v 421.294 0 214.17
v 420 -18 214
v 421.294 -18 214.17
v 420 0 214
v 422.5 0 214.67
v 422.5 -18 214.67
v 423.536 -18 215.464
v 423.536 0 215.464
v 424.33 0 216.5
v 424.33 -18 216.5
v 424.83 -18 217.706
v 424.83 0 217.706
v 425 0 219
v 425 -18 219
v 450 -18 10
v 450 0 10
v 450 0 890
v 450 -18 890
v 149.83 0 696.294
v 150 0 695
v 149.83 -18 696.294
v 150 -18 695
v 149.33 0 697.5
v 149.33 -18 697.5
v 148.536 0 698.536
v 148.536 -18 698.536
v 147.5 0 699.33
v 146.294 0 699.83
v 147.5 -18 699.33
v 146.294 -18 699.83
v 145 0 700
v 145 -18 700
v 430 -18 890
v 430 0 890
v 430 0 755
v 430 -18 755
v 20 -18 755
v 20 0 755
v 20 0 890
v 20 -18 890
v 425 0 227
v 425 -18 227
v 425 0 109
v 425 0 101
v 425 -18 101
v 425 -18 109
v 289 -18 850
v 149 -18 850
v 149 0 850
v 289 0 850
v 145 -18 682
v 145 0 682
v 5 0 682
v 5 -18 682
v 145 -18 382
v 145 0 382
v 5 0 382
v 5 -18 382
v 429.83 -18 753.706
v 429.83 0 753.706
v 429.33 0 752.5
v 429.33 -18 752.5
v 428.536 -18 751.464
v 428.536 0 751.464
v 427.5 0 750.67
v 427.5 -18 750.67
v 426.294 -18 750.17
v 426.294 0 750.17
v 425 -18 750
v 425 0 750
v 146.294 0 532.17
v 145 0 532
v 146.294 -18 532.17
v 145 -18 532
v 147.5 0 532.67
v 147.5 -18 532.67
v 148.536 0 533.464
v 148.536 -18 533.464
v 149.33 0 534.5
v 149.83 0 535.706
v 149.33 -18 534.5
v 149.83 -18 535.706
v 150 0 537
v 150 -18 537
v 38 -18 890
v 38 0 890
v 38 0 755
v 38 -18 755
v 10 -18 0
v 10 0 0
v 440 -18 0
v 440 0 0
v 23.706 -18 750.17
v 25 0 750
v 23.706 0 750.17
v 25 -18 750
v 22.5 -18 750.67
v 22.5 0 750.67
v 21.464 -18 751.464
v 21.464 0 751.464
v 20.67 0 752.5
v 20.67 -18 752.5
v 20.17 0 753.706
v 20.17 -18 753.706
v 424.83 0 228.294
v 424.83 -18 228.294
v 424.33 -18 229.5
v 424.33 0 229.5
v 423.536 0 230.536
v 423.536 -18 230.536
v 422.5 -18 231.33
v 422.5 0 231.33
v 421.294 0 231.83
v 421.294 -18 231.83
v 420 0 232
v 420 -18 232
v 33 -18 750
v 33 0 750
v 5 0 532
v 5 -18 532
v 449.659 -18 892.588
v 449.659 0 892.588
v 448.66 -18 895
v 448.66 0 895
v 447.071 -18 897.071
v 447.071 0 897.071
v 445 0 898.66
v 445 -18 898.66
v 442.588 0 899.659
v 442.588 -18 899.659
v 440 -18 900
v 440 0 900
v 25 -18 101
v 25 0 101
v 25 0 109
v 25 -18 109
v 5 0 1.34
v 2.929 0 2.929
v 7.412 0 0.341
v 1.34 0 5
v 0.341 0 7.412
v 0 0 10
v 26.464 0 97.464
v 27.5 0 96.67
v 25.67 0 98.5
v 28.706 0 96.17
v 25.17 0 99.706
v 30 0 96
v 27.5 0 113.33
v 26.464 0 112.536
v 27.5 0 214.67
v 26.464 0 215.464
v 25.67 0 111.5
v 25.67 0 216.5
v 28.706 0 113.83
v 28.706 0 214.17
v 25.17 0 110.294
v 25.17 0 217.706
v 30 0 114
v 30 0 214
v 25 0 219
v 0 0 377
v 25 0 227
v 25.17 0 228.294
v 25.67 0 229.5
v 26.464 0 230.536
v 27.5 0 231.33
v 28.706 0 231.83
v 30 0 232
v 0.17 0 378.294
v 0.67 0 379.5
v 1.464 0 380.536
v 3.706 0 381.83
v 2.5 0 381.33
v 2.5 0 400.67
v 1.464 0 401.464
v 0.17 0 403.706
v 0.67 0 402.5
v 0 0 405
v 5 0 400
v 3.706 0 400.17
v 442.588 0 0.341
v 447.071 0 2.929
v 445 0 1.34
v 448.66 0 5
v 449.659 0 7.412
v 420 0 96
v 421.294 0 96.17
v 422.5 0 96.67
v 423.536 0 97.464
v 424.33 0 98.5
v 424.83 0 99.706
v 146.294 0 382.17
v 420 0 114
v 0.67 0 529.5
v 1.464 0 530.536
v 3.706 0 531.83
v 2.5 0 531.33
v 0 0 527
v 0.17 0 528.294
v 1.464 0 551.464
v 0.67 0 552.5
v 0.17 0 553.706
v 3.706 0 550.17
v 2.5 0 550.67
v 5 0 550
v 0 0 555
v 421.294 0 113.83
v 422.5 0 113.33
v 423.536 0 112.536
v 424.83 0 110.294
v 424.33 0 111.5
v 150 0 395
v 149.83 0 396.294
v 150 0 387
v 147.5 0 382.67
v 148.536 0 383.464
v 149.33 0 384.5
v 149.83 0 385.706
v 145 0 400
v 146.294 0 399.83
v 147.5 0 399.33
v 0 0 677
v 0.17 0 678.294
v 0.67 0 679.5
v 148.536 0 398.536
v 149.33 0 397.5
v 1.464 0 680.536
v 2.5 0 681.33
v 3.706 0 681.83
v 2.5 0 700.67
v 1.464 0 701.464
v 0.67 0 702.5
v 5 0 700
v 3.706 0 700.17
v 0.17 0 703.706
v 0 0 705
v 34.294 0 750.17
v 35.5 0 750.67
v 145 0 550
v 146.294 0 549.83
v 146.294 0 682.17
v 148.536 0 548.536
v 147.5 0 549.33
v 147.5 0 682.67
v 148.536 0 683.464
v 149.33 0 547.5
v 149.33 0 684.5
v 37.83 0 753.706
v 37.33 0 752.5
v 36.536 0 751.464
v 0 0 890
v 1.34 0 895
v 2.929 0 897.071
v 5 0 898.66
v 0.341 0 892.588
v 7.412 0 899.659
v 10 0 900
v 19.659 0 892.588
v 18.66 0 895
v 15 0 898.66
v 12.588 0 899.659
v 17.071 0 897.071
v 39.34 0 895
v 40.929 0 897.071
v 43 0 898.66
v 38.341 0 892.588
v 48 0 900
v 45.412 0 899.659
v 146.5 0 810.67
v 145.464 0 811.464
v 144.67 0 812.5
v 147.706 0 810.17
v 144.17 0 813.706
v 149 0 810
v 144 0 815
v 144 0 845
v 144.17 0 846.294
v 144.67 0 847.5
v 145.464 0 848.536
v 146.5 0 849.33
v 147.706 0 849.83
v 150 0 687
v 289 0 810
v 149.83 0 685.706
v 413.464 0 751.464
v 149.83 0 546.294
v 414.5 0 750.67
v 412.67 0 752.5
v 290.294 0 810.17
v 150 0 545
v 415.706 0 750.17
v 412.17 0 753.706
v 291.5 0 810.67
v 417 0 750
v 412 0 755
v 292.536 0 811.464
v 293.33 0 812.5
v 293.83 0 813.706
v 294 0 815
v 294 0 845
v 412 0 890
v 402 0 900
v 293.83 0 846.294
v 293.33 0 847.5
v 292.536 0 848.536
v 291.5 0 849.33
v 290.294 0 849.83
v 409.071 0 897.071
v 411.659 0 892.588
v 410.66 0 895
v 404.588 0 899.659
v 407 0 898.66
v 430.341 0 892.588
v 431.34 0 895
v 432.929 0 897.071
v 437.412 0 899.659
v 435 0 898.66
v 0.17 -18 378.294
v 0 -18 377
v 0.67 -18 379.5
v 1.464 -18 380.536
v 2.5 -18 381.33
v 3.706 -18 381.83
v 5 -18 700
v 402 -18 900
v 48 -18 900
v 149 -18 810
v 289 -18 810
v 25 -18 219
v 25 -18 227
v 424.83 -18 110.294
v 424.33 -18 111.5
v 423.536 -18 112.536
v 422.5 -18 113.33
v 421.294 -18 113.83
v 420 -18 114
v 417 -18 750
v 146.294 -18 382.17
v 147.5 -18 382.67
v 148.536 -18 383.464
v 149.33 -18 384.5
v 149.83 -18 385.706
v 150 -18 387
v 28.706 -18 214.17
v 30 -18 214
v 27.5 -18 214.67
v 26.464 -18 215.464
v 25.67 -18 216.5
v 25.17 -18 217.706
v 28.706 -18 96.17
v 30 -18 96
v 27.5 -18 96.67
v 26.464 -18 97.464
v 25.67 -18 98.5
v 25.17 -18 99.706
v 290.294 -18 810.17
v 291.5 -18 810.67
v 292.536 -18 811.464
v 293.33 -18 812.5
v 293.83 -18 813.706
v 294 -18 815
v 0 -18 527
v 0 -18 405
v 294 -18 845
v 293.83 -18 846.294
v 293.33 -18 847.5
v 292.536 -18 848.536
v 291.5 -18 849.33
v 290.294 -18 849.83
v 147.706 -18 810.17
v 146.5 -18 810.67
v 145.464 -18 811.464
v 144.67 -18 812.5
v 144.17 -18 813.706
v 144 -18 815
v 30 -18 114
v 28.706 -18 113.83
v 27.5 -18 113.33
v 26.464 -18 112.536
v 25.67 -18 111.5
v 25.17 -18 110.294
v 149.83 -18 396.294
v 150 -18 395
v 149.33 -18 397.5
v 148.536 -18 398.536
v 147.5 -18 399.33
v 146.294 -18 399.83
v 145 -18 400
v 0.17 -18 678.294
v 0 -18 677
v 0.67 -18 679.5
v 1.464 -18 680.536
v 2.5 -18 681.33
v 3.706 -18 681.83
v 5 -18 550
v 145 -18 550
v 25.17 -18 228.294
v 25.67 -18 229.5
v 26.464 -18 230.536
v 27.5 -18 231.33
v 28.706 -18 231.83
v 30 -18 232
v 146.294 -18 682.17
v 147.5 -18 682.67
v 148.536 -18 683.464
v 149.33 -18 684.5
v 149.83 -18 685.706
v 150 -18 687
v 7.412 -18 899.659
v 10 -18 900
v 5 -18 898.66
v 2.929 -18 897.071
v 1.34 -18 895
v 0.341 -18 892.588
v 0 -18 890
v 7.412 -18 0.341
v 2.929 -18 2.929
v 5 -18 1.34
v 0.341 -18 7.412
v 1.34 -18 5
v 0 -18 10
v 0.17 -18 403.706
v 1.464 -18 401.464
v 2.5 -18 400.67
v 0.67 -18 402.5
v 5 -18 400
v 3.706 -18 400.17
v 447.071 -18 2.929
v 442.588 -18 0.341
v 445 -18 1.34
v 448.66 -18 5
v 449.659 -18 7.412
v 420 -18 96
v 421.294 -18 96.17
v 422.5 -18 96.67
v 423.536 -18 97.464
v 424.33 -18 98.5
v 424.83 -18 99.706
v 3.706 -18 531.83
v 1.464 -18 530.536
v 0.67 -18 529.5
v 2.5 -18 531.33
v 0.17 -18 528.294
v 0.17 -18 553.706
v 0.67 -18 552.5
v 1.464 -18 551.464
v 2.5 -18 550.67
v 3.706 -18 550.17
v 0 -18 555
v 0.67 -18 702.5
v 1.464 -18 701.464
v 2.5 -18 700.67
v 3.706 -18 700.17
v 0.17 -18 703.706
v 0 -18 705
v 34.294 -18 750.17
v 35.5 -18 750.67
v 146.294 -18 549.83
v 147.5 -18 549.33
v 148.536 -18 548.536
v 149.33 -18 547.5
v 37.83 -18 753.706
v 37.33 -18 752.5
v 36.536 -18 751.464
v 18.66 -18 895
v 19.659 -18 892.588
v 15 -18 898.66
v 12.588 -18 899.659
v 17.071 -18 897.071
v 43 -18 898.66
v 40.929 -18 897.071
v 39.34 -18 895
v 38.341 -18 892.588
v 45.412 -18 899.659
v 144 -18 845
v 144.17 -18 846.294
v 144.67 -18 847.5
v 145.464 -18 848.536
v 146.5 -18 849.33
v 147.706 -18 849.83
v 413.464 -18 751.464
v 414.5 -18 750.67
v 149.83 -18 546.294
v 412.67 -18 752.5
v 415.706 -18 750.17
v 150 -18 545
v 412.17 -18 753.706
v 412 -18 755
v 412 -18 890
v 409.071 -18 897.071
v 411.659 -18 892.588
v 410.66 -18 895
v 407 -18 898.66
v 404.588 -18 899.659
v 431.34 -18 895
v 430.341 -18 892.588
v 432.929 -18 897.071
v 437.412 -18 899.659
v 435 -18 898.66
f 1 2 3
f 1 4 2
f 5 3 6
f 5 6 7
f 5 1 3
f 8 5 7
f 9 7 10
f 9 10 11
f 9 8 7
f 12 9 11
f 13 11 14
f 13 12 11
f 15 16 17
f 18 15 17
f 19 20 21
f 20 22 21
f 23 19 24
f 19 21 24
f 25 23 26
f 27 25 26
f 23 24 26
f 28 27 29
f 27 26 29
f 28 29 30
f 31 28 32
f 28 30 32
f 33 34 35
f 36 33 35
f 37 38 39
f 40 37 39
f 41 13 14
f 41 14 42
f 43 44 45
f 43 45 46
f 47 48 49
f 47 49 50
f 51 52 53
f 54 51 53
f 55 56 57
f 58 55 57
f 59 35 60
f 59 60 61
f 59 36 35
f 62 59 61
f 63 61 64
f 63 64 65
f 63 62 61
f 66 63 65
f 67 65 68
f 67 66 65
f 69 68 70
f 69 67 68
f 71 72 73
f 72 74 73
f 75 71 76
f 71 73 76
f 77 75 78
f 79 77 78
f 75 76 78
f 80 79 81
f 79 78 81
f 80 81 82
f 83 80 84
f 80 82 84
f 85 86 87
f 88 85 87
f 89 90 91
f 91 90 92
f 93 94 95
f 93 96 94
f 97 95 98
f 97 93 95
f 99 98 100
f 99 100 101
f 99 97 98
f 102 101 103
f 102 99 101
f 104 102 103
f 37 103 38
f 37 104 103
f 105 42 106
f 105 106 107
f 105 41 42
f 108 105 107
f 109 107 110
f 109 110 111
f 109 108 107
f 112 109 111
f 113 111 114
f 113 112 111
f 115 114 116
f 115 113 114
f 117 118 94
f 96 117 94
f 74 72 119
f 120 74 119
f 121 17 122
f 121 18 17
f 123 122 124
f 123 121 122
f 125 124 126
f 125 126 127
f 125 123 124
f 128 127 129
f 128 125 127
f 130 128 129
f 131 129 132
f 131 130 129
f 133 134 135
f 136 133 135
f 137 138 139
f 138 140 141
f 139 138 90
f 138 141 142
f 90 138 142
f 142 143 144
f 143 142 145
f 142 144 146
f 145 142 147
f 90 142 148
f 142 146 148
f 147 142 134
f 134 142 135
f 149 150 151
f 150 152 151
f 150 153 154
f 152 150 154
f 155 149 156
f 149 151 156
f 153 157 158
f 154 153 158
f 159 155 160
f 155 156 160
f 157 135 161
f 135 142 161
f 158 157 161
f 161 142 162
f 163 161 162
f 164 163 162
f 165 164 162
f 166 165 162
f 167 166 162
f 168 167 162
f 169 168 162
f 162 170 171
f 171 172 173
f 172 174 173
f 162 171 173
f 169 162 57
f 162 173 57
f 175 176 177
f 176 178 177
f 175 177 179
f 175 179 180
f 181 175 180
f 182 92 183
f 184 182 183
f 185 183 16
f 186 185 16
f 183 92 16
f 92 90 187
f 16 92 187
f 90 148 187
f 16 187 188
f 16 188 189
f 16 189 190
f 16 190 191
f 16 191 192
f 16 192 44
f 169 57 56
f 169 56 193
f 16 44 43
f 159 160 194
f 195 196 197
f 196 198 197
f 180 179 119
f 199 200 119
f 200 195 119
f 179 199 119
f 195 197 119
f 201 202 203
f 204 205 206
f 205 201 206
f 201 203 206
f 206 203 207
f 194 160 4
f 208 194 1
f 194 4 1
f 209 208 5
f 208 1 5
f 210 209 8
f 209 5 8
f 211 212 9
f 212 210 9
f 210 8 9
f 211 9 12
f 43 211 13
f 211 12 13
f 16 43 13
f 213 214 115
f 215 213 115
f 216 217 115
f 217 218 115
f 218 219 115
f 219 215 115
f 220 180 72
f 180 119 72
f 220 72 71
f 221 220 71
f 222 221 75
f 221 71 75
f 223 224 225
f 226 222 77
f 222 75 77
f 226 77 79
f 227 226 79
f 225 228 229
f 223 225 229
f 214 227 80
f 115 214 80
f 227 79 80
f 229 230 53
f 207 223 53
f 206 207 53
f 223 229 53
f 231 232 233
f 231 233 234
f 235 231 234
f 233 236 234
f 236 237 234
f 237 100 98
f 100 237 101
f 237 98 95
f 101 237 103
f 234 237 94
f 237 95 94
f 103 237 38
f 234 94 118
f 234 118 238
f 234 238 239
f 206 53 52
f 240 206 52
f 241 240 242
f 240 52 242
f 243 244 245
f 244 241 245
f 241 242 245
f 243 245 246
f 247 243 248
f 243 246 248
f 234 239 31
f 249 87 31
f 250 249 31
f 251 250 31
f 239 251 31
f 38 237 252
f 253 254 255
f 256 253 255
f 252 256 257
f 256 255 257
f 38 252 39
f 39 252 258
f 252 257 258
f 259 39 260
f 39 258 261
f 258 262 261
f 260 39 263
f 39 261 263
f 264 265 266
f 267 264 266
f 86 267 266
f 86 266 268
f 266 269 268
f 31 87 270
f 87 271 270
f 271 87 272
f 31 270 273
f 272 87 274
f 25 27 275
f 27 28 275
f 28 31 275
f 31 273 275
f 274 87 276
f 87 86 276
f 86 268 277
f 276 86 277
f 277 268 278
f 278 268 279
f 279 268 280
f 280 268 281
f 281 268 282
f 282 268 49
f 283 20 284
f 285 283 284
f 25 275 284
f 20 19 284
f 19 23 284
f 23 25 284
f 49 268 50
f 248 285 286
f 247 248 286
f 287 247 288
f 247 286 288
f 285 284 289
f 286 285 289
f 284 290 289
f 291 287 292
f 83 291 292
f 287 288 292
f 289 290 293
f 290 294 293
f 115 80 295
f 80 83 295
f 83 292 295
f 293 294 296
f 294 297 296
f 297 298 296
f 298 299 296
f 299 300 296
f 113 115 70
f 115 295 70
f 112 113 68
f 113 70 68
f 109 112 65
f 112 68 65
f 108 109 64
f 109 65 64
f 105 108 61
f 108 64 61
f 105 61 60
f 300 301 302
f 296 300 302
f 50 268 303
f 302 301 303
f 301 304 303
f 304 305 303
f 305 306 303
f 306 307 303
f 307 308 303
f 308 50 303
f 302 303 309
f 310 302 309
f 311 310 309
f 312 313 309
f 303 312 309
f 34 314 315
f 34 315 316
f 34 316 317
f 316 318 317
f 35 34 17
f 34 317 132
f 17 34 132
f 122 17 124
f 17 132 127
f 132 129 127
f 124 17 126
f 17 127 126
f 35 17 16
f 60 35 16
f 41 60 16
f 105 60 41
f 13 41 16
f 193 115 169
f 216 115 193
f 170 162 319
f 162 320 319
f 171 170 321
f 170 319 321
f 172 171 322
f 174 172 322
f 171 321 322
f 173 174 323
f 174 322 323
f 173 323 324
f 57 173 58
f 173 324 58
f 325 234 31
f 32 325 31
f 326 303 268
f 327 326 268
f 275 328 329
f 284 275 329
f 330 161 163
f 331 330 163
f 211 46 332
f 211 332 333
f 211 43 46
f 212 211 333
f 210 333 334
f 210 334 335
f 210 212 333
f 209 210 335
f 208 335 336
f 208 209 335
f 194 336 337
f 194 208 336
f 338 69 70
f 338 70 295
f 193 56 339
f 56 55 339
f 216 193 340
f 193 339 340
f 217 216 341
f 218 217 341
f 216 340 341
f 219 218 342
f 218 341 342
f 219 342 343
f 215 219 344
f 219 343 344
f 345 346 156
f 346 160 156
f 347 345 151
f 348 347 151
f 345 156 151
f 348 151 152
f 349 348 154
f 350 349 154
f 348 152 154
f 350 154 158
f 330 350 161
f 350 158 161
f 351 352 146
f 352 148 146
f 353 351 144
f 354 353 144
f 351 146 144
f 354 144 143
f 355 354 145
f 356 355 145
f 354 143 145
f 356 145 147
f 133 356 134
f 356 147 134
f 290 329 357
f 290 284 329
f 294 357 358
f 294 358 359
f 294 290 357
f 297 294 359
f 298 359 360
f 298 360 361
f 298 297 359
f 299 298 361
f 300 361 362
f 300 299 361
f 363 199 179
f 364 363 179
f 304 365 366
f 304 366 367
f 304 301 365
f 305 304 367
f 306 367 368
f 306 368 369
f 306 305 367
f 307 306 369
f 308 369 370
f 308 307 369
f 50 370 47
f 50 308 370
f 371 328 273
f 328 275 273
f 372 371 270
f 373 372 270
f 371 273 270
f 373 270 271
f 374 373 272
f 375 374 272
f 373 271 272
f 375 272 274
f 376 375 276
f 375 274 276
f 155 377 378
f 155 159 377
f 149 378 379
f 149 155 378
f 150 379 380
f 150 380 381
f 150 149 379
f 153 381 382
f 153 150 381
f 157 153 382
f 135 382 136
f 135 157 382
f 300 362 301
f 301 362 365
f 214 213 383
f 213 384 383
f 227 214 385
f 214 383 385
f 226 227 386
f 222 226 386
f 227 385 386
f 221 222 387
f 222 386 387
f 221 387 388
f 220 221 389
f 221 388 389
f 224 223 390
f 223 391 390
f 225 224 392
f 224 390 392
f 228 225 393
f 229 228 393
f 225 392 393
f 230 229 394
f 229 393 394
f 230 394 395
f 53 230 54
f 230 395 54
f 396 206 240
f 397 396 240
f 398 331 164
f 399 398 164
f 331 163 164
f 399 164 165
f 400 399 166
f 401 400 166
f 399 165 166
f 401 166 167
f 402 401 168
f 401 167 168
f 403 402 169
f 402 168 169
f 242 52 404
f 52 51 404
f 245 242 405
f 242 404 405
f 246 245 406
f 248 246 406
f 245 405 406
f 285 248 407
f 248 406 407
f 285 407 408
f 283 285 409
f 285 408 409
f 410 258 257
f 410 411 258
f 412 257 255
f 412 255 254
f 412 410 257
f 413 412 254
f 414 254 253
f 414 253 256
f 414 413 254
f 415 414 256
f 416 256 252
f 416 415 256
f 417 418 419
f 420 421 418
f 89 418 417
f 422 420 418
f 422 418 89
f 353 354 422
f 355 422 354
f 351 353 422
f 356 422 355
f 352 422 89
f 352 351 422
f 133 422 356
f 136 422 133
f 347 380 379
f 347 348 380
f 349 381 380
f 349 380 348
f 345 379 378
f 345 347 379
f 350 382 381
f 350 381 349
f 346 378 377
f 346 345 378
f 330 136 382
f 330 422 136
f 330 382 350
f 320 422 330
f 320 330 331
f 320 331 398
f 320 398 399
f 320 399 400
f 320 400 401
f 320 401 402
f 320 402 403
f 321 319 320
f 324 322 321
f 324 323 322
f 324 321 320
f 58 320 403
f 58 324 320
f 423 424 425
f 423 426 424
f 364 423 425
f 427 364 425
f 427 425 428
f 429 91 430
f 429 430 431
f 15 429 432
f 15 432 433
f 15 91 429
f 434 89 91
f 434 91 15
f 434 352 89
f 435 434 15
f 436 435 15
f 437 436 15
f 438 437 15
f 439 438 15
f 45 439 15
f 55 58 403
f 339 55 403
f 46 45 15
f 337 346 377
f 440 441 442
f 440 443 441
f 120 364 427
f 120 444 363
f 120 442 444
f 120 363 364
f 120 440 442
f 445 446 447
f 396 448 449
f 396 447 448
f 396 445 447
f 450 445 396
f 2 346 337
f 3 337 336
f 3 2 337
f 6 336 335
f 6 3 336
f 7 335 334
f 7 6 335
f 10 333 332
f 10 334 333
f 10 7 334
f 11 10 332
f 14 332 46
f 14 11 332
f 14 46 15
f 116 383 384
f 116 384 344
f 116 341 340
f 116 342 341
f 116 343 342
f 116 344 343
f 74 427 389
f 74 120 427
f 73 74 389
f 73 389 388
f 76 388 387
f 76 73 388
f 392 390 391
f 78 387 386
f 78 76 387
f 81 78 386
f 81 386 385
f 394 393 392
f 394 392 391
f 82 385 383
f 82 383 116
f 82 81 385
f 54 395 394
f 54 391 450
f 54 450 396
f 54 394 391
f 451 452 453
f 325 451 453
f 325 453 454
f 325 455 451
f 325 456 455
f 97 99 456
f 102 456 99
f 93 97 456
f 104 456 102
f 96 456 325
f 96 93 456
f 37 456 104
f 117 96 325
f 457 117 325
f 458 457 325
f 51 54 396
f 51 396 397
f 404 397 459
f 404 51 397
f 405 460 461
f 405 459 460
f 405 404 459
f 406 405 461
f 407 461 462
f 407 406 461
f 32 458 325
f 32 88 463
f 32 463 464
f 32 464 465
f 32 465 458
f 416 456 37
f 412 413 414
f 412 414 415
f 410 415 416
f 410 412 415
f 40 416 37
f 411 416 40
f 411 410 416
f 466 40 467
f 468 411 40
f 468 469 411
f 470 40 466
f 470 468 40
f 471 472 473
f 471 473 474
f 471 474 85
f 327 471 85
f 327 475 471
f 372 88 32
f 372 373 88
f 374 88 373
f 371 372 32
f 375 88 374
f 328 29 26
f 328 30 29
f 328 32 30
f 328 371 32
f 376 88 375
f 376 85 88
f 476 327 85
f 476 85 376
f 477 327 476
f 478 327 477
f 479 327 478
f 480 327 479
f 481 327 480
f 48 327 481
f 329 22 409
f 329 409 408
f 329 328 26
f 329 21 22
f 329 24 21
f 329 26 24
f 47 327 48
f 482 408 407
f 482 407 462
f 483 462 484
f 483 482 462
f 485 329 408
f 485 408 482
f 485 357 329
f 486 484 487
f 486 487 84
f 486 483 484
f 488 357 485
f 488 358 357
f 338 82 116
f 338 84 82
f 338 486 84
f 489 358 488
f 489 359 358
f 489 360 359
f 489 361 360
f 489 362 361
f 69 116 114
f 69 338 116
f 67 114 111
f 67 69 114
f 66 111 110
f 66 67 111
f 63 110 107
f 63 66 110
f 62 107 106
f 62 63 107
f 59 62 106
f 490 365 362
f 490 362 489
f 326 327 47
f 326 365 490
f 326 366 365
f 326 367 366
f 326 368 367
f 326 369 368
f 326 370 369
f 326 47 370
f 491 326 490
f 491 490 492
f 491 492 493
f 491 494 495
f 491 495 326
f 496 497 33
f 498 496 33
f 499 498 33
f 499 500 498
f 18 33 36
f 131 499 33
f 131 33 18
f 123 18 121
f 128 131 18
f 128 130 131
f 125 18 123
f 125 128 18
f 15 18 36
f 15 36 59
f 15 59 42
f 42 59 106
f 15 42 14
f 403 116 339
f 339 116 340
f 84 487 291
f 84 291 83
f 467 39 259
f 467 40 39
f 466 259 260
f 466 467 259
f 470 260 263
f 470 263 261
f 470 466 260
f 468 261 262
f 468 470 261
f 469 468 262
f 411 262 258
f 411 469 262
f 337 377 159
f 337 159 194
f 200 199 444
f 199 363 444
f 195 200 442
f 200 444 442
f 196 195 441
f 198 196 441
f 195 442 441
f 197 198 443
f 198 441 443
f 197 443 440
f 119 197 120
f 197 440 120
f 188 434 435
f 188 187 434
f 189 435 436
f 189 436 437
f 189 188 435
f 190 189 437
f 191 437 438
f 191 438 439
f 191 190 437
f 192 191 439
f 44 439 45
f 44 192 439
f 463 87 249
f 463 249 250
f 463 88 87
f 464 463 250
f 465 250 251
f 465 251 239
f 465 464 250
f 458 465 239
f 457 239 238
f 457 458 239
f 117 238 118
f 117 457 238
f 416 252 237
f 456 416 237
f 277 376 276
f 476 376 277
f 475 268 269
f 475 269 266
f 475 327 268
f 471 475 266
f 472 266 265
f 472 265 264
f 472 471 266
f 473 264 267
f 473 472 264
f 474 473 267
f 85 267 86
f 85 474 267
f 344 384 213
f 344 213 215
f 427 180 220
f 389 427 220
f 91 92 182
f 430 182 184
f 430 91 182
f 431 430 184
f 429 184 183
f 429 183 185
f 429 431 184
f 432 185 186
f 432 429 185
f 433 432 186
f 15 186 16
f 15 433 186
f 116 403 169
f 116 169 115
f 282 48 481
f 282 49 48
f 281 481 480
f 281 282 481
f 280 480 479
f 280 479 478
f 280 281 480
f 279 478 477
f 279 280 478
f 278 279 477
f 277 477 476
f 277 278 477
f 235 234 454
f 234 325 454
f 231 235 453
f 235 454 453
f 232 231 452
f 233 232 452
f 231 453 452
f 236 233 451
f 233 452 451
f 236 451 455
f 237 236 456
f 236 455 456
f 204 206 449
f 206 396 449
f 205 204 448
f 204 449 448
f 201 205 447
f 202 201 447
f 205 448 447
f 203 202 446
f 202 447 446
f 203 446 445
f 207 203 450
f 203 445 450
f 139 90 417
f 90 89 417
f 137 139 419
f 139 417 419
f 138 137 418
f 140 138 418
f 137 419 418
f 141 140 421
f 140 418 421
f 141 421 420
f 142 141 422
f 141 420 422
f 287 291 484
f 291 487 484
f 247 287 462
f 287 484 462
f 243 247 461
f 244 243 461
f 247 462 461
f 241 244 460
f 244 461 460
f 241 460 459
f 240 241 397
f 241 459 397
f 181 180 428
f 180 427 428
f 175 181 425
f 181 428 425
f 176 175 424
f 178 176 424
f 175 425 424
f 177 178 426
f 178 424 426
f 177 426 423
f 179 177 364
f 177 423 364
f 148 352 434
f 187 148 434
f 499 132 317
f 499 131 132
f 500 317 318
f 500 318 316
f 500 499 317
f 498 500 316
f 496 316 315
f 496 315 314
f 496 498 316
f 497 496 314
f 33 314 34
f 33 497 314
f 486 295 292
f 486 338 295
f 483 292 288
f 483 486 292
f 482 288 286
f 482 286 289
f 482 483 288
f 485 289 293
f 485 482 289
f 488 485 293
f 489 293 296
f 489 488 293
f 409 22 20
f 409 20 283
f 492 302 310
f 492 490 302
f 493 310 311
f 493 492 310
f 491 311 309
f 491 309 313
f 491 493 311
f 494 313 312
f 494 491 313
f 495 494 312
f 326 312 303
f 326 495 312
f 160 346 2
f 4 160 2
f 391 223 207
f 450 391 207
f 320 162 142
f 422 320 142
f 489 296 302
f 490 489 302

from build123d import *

# Parameters (mm, degrees)
F1_DEPTH  = 18
F2_W      = 400
F2_H      = 18
F3_DEPTH  = 25
F4_W      = 400
F4_H      = 18
F5_DEPTH  = 25
F6_R      = 10
F7_R      = 10
F8_R      = 9.99999
F9_R      = 5
F10_R     = 5
F11_R     = 5
F12_W     = 150
F12_H     = 40
F13_DEPTH = 25
F14_R     = 5


# Not quite as in the source:
# - a fillet or chamfer is up to 0.001 mm smaller than in the source, because OpenCascade refuses the exact size


with BuildPart() as f1:
    # F0 (on Front) → F1 (new body)
    with BuildSketch(Plane.XZ):
        Polygon((0, 382), (0, 0), (450, 0), (450, 900), (430, 900), (430, 750), (412, 750), (412, 900), (38, 900), (38, 750), (20, 750), (20, 900), (0, 900), (0, 700), (150, 700), (150, 682), (0, 682), (0, 550), (150, 550), (150, 532), (0, 532), (0, 400), (150, 400), (150, 382), align=None)
    extrude(amount=F1_DEPTH)

    # F2 (on face) → F3 (cut)
    with BuildSketch(Plane.XZ.offset(18)):
        with Locations((225, 223)):
            Rectangle(F2_W, F2_H)
    extrude(amount=-F3_DEPTH, mode=Mode.SUBTRACT)

    # F4 (on face) → F5 (cut)
    with BuildSketch(Plane.XZ.offset(18)):
        with Locations((225, 105)):
            Rectangle(F4_W, F4_H)
    extrude(amount=-F5_DEPTH, mode=Mode.SUBTRACT)

    # F6
    f6_edges = [f1.edges().sort_by_distance(p)[0] for p in [
        (450, -9, 0),
    ]]
    fillet(f6_edges, radius=F6_R)

    # F7
    f7_edges = [f1.edges().sort_by_distance(p)[0] for p in [
        (0, -9, 0),
    ]]
    fillet(f7_edges, radius=F7_R)

    # F8 (radius 10 in the source; OpenCascade refuses exactly that, so slightly less here)
    f8_edges = [f1.edges().sort_by_distance(p)[0] for p in [
        (450, -9, 900),
        (430, -9, 900),
        (412, -9, 900),
        (38, -9, 900),
        (20, -9, 900),
        (0, -9, 900),
    ]]
    fillet(f8_edges, radius=F8_R)

    # F9
    f9_edges = [f1.edges().sort_by_distance(p)[0] for p in [
        (0, -9, 382),
        (0, -9, 400),
        (0, -9, 532),
        (0, -9, 550),
        (0, -9, 682),
        (0, -9, 700),
    ]]
    fillet(f9_edges, radius=F9_R)

    # F10
    f10_edges = [f1.edges().sort_by_distance(p)[0] for p in [
        (25, -9, 232),
        (25, -9, 214),
        (25, -9, 96),
        (25, -9, 114),
        (425, -9, 114),
        (425, -9, 96),
        (425, -9, 214),
        (425, -9, 232),
    ]]
    fillet(f10_edges, radius=F10_R)

    # F11
    f11_edges = [f1.edges().sort_by_distance(p)[0] for p in [
        (150, -9, 382),
        (150, -9, 400),
        (150, -9, 532),
        (150, -9, 550),
        (150, -9, 700),
        (150, -9, 682),
        (38, -9, 750),
        (20, -9, 750),
        (412, -9, 750),
        (430, -9, 750),
    ]]
    fillet(f11_edges, radius=F11_R)

    # F12 (on face) → F13 (cut)
    with BuildSketch(Plane.XZ.offset(18)):
        with Locations((219, 830)):
            Rectangle(F12_W, F12_H)
    extrude(amount=-F13_DEPTH, mode=Mode.SUBTRACT)

    # F14
    f14_edges = [f1.edges().sort_by_distance(p)[0] for p in [
        (144, -9, 810),
        (144, -9, 850),
        (294, -9, 850),
        (294, -9, 810),
    ]]
    fillet(f14_edges, radius=F14_R)


solid = f1.part
